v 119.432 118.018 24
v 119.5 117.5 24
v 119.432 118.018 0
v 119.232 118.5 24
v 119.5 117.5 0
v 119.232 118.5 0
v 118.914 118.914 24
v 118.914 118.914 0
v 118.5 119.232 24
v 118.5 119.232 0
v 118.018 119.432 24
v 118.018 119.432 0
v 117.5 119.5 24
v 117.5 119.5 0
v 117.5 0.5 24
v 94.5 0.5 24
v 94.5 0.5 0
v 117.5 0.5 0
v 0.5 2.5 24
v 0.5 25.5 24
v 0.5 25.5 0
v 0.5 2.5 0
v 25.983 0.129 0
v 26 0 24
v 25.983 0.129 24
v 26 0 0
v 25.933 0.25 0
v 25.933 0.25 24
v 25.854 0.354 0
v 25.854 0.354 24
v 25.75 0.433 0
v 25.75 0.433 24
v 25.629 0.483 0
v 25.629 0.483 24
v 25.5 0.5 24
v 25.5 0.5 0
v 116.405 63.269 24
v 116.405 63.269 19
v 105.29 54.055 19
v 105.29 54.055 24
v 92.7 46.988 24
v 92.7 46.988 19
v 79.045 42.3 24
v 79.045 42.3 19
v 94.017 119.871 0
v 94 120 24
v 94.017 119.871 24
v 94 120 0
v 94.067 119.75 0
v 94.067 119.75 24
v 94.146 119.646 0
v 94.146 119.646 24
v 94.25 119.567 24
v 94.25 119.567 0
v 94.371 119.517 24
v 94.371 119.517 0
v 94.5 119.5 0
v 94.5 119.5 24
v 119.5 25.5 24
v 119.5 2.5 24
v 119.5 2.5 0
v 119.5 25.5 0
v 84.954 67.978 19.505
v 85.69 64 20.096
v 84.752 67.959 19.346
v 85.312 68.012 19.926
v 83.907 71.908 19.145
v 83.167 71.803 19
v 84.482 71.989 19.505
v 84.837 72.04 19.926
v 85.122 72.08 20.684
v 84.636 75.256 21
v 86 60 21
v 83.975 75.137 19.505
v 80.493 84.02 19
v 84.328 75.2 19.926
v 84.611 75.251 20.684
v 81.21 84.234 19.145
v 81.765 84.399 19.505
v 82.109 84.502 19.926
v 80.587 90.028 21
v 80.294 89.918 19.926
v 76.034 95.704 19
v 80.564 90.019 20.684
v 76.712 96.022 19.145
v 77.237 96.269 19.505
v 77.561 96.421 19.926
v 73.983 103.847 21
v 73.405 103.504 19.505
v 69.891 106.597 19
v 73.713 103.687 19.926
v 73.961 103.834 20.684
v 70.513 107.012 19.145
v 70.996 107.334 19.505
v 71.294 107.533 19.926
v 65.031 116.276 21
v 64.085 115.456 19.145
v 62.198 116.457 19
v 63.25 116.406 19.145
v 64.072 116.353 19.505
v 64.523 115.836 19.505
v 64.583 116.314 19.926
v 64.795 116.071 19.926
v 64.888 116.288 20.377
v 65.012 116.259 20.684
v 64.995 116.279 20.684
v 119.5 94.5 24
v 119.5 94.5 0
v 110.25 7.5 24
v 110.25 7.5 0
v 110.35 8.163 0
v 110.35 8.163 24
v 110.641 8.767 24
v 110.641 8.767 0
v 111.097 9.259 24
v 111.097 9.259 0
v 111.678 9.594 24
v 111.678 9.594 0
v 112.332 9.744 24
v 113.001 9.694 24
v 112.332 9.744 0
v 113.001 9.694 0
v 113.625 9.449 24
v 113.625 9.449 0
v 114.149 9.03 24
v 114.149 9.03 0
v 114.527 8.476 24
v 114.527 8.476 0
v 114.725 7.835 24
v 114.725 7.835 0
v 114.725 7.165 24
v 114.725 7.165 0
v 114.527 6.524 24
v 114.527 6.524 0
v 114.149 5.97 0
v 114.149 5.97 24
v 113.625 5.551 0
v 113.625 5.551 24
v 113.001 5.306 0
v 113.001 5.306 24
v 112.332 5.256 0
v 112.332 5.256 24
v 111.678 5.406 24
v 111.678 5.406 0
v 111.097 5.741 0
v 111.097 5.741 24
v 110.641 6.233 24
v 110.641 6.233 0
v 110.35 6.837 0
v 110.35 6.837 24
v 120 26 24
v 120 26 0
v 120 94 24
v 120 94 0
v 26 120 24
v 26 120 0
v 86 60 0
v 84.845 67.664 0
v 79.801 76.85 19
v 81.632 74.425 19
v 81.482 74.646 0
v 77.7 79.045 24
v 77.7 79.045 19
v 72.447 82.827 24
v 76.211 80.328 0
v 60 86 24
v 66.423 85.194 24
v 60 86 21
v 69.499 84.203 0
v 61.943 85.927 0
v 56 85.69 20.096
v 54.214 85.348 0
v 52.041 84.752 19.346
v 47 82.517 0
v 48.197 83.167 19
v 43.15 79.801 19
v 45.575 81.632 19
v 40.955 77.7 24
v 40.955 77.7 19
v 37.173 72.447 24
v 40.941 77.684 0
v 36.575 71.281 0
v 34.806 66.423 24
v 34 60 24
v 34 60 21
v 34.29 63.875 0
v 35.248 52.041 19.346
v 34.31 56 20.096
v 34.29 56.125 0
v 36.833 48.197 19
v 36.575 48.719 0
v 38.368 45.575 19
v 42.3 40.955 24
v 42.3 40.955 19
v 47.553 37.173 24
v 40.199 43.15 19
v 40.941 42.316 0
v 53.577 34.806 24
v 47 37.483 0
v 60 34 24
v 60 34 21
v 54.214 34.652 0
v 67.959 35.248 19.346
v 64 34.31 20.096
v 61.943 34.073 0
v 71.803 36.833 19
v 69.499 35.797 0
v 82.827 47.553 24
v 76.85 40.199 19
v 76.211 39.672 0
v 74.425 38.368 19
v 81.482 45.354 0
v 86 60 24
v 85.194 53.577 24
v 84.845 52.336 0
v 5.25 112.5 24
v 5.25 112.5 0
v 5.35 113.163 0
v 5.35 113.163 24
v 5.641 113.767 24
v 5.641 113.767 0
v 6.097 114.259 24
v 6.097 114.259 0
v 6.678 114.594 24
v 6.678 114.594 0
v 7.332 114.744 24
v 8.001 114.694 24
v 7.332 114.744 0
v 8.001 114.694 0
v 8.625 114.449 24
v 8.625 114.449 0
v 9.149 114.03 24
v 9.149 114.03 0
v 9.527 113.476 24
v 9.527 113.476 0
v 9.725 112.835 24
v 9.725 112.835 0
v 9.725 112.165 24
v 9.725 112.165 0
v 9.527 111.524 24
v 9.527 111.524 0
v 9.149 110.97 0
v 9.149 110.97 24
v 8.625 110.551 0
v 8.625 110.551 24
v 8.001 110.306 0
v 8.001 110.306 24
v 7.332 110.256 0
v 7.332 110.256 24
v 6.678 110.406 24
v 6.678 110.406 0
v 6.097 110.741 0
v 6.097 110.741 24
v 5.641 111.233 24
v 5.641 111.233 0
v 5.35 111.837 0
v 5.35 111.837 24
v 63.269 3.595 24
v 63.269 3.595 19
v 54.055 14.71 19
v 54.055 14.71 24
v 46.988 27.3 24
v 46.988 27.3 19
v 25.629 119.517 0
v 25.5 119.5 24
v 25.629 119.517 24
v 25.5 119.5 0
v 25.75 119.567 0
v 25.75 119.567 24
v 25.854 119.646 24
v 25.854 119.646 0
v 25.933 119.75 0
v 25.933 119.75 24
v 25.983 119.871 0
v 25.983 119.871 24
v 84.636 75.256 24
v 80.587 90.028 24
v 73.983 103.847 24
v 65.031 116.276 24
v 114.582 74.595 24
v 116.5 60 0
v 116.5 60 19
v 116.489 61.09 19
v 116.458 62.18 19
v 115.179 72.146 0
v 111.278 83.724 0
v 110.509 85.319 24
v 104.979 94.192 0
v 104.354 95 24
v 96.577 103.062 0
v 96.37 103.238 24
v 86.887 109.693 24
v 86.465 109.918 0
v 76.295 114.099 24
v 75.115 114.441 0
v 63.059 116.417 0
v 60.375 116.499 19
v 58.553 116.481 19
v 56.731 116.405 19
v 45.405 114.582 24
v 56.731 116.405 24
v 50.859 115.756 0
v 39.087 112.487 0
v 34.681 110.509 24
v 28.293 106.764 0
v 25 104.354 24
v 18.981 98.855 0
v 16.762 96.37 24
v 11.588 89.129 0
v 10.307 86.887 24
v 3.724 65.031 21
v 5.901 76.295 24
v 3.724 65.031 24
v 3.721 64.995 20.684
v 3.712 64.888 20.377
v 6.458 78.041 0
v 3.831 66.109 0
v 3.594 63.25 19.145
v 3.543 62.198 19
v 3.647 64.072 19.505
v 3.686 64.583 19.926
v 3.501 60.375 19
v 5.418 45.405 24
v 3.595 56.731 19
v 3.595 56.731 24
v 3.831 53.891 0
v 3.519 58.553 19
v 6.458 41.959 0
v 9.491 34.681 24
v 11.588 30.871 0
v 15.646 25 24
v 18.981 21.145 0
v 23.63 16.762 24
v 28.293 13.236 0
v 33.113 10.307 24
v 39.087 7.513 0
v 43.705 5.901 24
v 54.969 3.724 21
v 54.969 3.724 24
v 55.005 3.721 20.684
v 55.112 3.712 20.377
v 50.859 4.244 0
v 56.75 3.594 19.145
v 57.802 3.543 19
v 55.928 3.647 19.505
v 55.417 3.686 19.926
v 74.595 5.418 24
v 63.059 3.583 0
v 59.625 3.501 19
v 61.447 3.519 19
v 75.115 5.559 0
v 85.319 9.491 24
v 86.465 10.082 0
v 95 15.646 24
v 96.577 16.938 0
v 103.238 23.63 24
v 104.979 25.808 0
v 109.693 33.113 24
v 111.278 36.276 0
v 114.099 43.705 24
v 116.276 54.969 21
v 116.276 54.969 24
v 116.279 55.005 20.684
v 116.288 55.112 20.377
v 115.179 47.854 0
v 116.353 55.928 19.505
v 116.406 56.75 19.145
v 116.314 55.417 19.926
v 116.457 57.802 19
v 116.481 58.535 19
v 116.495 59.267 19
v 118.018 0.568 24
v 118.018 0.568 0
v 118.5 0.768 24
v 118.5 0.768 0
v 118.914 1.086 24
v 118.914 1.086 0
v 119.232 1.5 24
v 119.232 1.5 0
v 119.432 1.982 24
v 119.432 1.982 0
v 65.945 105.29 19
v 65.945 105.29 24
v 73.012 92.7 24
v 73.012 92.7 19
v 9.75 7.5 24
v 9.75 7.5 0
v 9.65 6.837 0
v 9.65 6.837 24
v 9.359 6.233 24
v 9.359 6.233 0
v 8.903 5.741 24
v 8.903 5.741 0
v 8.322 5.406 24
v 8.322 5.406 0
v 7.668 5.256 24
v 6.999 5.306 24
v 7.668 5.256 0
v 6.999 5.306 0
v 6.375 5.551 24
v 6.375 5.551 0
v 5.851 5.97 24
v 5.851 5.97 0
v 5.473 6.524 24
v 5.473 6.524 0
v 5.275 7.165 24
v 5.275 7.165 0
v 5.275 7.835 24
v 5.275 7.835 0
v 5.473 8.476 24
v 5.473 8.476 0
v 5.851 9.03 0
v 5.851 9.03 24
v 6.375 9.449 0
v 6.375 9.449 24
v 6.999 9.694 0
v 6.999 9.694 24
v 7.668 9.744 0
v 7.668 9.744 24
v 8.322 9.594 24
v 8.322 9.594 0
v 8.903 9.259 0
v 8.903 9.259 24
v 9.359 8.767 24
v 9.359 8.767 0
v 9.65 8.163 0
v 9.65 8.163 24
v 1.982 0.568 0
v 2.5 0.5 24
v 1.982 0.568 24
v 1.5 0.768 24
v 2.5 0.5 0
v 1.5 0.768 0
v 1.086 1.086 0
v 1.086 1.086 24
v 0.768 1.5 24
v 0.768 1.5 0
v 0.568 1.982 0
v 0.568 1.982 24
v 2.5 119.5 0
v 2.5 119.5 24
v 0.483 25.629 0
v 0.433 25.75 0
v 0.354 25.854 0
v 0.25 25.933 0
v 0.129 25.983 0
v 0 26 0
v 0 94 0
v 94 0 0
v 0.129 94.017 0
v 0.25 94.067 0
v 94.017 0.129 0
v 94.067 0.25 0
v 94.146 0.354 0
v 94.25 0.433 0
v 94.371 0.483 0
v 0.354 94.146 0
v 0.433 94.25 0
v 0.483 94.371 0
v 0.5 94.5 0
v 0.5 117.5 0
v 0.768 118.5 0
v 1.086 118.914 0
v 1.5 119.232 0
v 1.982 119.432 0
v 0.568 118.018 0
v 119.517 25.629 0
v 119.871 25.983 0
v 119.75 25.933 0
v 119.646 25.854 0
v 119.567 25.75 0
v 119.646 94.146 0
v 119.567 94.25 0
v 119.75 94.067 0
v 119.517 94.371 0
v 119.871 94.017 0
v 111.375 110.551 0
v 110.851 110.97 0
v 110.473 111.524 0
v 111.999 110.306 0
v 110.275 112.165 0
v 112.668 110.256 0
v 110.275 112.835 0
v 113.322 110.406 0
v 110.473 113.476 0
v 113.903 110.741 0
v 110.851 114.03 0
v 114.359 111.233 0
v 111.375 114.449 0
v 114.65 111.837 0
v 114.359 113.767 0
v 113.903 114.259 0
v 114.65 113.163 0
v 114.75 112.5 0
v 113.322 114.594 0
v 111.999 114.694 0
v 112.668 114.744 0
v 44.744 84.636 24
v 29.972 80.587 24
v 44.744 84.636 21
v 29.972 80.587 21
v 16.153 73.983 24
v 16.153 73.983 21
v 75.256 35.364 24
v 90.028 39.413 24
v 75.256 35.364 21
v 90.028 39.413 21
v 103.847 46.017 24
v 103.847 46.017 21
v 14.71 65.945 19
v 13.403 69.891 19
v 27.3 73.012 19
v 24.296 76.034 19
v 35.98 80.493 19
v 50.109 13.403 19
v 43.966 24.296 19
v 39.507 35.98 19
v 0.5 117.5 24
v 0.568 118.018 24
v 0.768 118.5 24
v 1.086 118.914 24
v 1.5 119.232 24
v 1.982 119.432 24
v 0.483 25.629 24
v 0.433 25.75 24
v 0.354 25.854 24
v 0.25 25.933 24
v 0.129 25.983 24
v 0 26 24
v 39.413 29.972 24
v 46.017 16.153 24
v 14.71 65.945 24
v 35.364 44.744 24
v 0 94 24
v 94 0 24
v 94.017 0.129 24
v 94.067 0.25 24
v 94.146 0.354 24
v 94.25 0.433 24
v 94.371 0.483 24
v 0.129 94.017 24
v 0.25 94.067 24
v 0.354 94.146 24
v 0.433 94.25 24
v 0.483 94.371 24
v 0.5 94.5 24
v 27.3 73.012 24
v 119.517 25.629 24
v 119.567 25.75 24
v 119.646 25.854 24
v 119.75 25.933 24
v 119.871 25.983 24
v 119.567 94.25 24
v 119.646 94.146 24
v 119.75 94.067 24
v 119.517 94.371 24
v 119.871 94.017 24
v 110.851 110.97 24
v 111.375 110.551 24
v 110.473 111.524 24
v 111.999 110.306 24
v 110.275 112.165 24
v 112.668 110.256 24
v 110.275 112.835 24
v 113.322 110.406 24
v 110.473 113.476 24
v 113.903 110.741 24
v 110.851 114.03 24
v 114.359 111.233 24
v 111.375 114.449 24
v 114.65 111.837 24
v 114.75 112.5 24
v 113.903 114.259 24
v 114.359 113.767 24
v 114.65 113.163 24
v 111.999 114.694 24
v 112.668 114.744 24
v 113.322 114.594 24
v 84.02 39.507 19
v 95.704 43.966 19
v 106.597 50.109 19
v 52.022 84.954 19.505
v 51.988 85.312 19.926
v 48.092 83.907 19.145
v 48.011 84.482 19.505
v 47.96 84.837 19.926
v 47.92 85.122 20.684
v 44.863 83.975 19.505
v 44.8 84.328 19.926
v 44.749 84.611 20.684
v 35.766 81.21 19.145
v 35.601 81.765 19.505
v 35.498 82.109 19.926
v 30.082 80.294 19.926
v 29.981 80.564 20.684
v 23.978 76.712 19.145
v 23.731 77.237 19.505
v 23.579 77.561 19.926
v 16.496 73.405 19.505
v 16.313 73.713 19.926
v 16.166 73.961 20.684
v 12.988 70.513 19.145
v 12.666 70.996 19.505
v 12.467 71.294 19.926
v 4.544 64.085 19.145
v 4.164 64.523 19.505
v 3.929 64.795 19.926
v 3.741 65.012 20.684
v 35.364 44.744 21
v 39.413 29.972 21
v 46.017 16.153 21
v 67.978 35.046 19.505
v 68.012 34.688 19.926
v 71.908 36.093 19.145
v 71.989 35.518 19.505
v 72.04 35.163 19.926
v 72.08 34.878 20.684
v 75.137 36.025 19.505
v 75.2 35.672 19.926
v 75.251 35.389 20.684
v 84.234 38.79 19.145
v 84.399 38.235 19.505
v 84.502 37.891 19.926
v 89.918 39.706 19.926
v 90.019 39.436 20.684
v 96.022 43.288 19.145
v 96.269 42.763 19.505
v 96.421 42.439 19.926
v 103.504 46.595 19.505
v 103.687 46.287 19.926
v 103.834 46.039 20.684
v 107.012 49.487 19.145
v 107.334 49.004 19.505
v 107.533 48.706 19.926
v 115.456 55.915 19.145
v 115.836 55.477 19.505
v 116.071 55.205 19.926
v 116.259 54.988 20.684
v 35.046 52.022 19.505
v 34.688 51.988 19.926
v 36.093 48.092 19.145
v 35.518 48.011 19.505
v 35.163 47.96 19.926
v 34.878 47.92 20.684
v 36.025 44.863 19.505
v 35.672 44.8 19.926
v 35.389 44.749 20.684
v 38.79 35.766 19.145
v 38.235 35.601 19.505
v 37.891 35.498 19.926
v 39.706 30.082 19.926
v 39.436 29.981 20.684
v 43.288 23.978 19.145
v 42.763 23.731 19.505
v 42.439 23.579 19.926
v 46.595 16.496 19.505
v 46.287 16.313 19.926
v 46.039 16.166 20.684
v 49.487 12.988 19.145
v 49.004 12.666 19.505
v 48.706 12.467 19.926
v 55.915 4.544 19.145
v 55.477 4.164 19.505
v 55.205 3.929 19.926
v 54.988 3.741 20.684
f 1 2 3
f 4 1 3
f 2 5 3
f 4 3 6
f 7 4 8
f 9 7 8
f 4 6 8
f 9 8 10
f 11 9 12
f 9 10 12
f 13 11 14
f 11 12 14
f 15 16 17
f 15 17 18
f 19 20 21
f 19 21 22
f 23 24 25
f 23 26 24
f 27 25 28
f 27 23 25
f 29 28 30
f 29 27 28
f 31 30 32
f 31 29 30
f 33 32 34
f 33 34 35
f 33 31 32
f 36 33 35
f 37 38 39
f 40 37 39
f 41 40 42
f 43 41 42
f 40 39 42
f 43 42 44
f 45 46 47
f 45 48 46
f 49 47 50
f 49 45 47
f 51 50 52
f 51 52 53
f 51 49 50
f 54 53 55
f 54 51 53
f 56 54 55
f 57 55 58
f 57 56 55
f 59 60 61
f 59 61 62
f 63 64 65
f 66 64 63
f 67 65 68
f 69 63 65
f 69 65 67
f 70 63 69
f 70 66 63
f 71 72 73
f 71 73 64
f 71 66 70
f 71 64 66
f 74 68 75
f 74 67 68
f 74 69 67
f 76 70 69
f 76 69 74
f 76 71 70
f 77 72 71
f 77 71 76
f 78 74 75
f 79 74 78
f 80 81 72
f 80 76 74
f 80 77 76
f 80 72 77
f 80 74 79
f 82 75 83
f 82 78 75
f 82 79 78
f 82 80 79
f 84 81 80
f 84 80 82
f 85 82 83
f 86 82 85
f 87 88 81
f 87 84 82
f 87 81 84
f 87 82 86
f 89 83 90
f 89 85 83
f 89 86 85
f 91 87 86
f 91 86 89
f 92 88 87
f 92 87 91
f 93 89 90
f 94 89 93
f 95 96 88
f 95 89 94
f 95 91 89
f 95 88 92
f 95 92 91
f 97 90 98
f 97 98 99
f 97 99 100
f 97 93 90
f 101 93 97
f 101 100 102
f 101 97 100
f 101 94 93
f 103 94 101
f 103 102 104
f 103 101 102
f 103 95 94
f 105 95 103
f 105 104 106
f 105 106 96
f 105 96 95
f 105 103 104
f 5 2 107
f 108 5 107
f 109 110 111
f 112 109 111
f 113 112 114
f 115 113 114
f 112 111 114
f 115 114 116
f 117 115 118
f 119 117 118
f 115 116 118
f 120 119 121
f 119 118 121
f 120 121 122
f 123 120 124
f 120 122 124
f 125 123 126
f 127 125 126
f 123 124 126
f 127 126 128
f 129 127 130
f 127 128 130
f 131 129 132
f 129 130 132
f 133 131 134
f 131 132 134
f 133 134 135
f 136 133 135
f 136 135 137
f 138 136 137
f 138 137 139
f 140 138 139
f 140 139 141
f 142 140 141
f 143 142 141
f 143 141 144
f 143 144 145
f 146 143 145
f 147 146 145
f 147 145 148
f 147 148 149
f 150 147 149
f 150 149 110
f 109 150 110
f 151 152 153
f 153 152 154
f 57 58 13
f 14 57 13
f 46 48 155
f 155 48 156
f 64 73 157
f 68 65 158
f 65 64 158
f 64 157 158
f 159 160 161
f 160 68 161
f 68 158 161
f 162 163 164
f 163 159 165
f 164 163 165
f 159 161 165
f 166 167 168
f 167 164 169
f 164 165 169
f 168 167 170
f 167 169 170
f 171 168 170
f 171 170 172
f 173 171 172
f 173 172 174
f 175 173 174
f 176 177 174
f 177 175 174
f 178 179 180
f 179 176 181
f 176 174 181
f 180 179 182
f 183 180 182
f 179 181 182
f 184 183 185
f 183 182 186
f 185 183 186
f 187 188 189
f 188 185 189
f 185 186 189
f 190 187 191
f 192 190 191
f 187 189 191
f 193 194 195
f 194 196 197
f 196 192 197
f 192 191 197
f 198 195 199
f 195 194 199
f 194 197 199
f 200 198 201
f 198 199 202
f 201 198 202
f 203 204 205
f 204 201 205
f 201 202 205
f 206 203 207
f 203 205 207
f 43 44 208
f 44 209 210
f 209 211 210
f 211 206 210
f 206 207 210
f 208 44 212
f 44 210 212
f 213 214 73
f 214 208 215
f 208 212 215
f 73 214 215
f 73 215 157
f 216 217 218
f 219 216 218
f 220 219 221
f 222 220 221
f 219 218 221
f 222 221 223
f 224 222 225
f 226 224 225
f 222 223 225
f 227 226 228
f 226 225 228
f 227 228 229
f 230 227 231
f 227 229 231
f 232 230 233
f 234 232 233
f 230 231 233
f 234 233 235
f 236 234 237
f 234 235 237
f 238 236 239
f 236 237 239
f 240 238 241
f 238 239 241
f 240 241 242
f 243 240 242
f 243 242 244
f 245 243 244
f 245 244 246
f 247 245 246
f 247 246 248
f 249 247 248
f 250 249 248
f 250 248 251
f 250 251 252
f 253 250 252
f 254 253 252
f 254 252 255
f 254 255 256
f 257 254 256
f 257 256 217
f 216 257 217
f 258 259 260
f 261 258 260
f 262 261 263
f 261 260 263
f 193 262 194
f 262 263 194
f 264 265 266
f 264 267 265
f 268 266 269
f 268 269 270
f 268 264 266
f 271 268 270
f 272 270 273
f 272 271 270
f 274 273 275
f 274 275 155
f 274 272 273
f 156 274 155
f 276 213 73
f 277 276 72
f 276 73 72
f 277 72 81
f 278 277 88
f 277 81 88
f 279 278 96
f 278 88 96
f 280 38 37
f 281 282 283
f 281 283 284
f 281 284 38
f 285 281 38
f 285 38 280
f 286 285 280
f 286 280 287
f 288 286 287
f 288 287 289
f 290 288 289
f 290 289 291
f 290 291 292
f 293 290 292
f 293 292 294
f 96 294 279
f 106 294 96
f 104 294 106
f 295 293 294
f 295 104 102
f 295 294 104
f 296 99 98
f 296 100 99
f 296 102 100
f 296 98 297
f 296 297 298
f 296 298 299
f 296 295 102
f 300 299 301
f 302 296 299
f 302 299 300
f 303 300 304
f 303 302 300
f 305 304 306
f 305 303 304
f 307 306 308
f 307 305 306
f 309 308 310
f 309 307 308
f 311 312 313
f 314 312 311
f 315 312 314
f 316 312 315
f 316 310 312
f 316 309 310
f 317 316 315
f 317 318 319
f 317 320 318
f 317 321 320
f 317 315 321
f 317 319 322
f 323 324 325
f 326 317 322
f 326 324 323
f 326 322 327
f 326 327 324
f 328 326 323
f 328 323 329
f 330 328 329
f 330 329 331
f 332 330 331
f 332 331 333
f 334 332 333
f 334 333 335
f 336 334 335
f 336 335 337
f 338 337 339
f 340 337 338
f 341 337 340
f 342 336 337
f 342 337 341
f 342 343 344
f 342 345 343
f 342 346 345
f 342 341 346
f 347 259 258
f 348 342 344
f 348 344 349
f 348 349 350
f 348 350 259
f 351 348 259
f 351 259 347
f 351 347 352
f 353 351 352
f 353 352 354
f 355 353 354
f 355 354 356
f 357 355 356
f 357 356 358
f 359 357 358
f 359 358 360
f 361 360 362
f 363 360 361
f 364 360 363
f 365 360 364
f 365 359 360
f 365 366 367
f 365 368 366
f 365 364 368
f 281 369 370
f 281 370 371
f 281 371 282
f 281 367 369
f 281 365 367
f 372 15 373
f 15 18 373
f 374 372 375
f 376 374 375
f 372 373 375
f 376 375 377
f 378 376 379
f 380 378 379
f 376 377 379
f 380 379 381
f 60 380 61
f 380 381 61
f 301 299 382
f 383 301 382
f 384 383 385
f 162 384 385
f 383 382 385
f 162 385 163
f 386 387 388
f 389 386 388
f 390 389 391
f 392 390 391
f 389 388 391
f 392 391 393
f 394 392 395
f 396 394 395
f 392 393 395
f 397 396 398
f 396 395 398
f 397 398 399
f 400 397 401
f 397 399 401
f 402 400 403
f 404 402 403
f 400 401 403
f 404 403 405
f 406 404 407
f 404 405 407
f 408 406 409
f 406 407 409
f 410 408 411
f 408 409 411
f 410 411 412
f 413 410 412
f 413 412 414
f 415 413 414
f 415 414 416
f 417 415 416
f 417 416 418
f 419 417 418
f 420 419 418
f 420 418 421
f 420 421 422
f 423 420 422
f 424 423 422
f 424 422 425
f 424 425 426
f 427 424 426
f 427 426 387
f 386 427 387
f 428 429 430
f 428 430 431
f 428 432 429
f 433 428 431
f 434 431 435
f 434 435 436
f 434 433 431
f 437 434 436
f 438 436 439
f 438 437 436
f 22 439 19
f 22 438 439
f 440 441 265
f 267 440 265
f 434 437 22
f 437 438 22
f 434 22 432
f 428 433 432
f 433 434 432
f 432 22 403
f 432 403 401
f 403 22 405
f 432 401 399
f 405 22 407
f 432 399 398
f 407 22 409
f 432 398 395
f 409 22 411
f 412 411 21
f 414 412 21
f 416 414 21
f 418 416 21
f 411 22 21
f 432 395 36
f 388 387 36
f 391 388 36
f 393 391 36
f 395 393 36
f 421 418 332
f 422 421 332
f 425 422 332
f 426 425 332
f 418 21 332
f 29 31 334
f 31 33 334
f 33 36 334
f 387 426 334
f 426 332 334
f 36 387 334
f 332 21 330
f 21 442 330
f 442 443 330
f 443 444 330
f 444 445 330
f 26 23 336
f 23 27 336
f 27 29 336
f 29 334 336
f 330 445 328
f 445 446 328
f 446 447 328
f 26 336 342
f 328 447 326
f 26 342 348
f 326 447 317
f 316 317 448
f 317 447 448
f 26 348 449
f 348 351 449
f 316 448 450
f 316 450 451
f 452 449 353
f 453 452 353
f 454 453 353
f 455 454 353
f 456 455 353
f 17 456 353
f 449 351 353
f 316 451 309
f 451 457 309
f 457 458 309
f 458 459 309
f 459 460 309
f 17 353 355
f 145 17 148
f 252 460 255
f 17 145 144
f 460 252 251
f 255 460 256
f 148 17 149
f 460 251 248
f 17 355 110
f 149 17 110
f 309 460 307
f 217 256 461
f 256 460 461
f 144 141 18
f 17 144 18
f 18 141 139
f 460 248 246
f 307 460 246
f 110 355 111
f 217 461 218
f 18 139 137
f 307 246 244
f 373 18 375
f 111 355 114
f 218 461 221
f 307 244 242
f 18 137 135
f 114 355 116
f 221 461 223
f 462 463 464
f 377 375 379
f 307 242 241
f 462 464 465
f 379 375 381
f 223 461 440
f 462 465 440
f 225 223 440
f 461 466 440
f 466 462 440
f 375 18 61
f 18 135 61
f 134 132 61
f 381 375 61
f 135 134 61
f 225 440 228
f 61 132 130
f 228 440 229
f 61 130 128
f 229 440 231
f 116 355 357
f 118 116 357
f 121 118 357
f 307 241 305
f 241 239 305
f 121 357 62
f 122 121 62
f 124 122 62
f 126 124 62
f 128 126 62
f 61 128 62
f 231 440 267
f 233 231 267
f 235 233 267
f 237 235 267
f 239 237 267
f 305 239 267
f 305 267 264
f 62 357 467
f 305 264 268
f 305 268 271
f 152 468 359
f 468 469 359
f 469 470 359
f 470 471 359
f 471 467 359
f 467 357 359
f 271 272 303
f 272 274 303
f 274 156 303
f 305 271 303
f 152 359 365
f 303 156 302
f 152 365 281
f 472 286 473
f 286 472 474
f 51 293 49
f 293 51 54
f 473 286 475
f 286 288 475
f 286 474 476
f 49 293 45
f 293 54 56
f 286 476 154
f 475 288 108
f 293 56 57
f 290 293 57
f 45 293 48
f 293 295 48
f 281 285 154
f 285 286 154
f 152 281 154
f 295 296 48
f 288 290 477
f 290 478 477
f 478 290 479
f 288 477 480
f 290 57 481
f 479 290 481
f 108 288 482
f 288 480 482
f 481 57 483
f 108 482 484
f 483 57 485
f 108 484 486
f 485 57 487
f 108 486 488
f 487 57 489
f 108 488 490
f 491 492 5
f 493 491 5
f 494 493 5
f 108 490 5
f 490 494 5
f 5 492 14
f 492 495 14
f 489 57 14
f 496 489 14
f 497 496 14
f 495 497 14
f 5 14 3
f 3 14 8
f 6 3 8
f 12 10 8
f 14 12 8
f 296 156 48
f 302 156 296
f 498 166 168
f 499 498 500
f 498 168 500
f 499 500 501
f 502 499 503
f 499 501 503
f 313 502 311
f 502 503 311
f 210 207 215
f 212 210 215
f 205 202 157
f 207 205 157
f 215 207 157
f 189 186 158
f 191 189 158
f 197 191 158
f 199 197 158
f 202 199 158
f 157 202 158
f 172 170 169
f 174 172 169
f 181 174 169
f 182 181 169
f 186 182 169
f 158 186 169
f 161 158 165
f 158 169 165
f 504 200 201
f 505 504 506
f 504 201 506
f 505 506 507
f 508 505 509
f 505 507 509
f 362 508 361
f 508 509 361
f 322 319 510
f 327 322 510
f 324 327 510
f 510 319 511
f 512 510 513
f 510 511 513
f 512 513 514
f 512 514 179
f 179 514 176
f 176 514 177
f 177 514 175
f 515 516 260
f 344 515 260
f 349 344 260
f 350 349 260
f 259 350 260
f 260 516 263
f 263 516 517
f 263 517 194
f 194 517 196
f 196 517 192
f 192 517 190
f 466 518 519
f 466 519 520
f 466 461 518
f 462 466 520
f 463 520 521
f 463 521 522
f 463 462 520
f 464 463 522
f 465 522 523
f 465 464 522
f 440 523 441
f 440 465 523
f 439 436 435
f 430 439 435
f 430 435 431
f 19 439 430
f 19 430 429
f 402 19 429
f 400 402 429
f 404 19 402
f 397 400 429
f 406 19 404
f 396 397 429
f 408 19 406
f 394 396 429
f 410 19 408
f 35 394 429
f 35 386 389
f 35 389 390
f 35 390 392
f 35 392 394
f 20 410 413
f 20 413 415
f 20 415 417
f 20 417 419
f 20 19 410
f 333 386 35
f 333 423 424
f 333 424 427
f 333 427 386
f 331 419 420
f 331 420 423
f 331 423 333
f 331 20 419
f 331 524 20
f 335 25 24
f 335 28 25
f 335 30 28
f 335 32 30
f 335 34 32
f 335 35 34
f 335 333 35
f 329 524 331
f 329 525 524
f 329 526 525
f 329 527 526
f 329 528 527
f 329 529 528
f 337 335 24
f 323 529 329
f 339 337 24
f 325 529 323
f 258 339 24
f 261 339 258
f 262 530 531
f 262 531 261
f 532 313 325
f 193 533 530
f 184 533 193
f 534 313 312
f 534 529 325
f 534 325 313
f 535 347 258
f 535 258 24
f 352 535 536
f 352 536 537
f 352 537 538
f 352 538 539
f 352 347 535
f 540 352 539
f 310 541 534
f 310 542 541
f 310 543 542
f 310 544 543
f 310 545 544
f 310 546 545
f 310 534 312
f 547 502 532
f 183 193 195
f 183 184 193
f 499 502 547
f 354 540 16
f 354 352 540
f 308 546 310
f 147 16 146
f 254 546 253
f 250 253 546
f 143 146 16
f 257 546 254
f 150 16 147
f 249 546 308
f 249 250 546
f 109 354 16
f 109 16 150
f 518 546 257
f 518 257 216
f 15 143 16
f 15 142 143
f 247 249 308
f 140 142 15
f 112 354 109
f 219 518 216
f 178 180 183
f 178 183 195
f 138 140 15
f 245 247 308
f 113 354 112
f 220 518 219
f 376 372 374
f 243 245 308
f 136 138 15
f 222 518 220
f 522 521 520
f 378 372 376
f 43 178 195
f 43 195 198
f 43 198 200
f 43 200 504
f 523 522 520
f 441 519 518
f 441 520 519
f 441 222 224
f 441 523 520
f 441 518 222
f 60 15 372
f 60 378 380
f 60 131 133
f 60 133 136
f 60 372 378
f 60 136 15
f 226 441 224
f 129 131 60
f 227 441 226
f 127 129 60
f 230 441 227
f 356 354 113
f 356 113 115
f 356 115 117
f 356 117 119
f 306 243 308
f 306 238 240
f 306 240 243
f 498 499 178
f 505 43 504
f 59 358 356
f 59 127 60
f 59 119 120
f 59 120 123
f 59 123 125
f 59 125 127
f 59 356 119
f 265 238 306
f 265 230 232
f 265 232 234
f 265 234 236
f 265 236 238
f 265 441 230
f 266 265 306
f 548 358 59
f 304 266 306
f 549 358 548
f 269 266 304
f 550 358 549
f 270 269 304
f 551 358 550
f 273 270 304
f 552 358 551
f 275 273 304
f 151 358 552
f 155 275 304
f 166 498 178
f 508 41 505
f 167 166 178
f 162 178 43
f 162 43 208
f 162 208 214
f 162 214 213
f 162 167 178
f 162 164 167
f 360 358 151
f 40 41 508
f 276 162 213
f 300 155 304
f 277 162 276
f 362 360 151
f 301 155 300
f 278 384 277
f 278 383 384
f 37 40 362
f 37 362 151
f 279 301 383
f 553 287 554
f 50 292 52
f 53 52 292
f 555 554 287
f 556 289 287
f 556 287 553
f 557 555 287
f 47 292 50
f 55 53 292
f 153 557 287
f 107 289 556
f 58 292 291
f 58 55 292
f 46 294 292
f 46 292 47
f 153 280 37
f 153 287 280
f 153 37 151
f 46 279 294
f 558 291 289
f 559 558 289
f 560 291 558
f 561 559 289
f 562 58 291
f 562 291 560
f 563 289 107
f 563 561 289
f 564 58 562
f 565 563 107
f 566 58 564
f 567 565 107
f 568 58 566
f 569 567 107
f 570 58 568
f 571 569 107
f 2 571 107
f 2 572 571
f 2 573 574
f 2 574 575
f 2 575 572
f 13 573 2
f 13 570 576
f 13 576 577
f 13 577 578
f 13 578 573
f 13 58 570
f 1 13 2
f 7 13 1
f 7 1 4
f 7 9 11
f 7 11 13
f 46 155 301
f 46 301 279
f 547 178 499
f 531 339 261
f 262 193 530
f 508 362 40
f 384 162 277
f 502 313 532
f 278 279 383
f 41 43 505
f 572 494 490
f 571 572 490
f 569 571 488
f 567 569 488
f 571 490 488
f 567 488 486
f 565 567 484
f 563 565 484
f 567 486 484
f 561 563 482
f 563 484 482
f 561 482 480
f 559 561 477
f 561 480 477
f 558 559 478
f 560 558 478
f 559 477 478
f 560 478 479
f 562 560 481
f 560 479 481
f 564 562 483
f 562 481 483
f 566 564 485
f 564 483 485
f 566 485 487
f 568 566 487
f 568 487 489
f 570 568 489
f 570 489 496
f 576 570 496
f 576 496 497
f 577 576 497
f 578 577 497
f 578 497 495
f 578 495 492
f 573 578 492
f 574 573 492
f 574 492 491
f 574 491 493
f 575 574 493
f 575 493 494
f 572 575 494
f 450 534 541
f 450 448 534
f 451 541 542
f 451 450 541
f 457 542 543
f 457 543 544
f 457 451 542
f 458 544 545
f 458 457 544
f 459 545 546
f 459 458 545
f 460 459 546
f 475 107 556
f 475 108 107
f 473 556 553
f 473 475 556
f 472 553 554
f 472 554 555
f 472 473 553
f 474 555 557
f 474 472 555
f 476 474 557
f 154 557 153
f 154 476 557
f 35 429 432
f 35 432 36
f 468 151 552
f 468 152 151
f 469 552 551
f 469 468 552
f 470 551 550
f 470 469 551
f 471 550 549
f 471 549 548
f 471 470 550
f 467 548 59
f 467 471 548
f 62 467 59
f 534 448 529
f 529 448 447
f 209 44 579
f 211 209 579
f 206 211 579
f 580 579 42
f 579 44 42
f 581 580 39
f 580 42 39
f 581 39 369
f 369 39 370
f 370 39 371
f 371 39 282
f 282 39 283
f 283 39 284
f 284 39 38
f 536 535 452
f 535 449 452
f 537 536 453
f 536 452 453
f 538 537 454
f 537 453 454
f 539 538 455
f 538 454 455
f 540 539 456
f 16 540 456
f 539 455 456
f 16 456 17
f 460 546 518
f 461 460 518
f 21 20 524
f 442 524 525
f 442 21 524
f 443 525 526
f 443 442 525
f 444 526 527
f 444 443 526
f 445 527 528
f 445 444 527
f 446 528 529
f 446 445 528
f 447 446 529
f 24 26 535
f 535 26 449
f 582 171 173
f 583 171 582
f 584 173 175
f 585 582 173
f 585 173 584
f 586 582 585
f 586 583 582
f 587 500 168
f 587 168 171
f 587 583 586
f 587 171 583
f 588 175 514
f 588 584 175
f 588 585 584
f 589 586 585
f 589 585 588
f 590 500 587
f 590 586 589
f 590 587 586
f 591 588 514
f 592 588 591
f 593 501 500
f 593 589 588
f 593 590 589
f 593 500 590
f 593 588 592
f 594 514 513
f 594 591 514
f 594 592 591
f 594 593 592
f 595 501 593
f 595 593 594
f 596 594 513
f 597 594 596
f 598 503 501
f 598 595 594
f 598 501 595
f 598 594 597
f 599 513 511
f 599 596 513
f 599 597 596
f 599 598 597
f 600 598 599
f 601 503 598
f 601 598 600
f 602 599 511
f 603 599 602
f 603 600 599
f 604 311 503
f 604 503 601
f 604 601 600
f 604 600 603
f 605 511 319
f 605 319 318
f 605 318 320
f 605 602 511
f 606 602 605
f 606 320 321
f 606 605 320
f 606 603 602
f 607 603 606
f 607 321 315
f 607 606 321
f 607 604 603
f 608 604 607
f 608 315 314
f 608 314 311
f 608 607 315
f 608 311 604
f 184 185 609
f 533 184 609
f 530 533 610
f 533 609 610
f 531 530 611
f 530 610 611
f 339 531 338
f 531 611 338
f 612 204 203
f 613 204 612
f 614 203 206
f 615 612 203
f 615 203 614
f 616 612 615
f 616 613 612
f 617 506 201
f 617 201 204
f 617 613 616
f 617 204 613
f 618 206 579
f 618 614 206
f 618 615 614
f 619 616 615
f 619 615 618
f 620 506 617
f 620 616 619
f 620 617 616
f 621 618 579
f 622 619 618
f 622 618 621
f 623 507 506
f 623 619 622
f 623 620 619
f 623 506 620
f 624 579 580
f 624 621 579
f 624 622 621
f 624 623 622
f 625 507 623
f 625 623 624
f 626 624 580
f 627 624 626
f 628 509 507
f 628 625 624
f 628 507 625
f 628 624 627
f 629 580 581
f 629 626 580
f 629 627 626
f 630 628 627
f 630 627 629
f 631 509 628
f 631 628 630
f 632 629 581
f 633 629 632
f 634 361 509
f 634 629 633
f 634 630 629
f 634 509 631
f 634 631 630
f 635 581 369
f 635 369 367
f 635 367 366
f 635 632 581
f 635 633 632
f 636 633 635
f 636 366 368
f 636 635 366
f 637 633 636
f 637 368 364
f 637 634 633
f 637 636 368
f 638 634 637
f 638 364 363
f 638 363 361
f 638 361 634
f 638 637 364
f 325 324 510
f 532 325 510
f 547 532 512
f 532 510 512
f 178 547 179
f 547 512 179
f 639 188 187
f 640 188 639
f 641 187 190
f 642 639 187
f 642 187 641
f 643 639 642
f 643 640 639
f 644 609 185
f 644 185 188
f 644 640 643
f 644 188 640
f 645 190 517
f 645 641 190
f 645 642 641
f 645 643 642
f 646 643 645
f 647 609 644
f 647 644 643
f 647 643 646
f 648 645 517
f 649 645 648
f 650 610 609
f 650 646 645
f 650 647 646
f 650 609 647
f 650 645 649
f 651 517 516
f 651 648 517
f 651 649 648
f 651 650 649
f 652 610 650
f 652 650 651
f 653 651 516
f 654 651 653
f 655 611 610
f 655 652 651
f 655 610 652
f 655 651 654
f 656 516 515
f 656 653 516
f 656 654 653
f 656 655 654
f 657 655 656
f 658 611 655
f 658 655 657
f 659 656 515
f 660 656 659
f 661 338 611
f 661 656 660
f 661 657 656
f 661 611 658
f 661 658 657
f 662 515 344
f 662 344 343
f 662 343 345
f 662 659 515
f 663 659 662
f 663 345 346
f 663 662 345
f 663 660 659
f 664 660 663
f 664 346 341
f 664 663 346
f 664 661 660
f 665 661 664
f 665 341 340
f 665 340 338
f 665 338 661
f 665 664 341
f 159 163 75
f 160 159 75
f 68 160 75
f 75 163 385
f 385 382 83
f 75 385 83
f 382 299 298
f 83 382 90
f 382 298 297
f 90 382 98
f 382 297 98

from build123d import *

# Parameters (mm, degrees)
ESQUISSE1_R             = 56.5
BOSS_EXTRU_1_DEPTH      = 24
ESQUISSE1_R_2           = 26
BOSS_EXTRU_1_2_DEPTH    = 24
ENL_V_MAT_EXTRU_1_DEPTH = 172.394282285
CONG_1_R                = 0.5
CONG_2_R                = 2
BOSS_EXTRU_2_START      = -5
BOSS_EXTRU_2_DEPTH      = 5
CONG_3_R                = 2
ESQUISSE4_R             = 2.25
ENL_V_MAT_EXTRU_2_DEPTH = 172.394282299


# Some blends are built 0.0001 mm under size
with BuildPart() as part:
    # Esquisse1 → Boss.-Extru.1 (new body)
    with BuildSketch(Plane.XY):
        Polygon((0, 95), (0, 0), (120, 0), (120, 120), (32.113356809, 120), (0.4, 120), (0, 120), (0, 114.342406945), align=None)
        with Locations((60, 60)):
            Circle(ESQUISSE1_R, mode=Mode.SUBTRACT)
    extrude(amount=BOSS_EXTRU_1_DEPTH)

    # Esquisse2 → Enlèv. mat.-Extru.1 (cut, through all)
    with BuildSketch(Plane.XY.offset(24)):
        Polygon((0, 94), (0.5, 94), (0.5, 119.5), (26, 119.5), (26, 120), (0, 120), align=None)
        Polygon((26, 0.5), (26, 0), (0, 0), (0, 26), (0.5, 26), (0.5, 0.5), align=None)
        Polygon((120, 0), (94, 0), (94, 0.5), (119.5, 0.5), (119.5, 26), (120, 26), align=None)
        Polygon((120, 120), (94, 120), (94, 119.5), (119.5, 119.5), (119.5, 94), (120, 94), align=None)
    extrude(amount=-ENL_V_MAT_EXTRU_1_DEPTH, mode=Mode.SUBTRACT)

    # Congé1
    cong_1_edges = [part.edges().sort_by_distance(p)[0] for p in [
        (94, 119.5, 12),
        (119.5, 94, 12),
        (94, 0.5, 12),
        (119.5, 26, 12),
        (26, 0.5, 12),
        (0.5, 26, 12),
        (0.5, 94, 12),
        (26, 119.5, 12),
    ]]
    fillet(cong_1_edges, radius=CONG_1_R - 0.0001)  # a hair under: the kernel refuses the full size

    # Congé2
    cong_2_edges = [part.edges().sort_by_distance(p)[0] for p in [
        (119.5, 119.5, 12),
        (119.5, 0.5, 12),
        (0.5, 0.5, 12),
        (0.5, 119.5, 12),
    ]]
    fillet(cong_2_edges, radius=CONG_2_R)



with BuildPart() as body_2:
    # Esquisse1 → Boss.-Extru.1 2 (new body)
    with BuildSketch(Plane.XY):
        with Locations((60, 60)):
            Circle(ESQUISSE1_R_2)
    extrude(amount=BOSS_EXTRU_1_2_DEPTH)


with BuildPart() as part_1:
    add(part.part)

    add(body_2.part)  # Boss.-Extru.2 merges body 2
    # Esquisse3 → Boss.-Extru.2 (add)
    with BuildSketch(Plane.XY.offset(24).offset(BOSS_EXTRU_2_START)):
        with BuildLine():
            ThreePointArc((3.724458924, 65.03125), (3.506910291, 60.883637464), (3.594634356, 56.73125))
            ThreePointArc((3.594634356, 56.73125), (20.845057368, 69.763102479), (40.955053164, 77.7))
            ThreePointArc((40.955053164, 77.7), (49.612507521, 83.834848437), (60, 86))
            ThreePointArc((60, 86), (29.972408521, 80.587491275), (3.724458924, 65.03125))
        make_face()
        with BuildLine():
            ThreePointArc((65.03125, 116.275541076), (60.883637464, 116.493089709), (56.73125, 116.405365644))
            ThreePointArc((56.73125, 116.405365644), (69.763102479, 99.154942632), (77.7, 79.044946836))
            ThreePointArc((77.7, 79.044946836), (83.834848437, 70.387492479), (86, 60))
            ThreePointArc((86, 60), (80.587491275, 90.027591479), (65.03125, 116.275541076))
        make_face()
        with BuildLine():
            ThreePointArc((60, 34), (90.027591479, 39.412508725), (116.275541076, 54.96875))
            ThreePointArc((116.275541076, 54.96875), (116.443857375, 57.481872801), (116.5, 60))
            ThreePointArc((116.5, 60), (116.476336456, 61.635059802), (116.405365644, 63.26875))
            ThreePointArc((116.405365644, 63.26875), (99.154942632, 50.236897521), (79.044946836, 42.3))
            ThreePointArc((79.044946836, 42.3), (70.387492479, 36.165151563), (60, 34))
        make_face()
        with BuildLine():
            ThreePointArc((34, 60), (39.412508725, 29.972408521), (54.96875, 3.724458924))
            ThreePointArc((54.96875, 3.724458924), (59.116362536, 3.506910291), (63.26875, 3.594634356))
            ThreePointArc((63.26875, 3.594634356), (50.236897521, 20.845057368), (42.3, 40.955053164))
            ThreePointArc((42.3, 40.955053164), (36.165151563, 49.612507521), (34, 60))
        make_face()
    extrude(amount=BOSS_EXTRU_2_DEPTH)

    # Congé3
    # the kernel refuses this fillet: 2 mm, written as the material it takes off along each edge
    with BuildSketch(Plane(origin=(60, 0, 19), x_dir=(0.17354982017034465, 0.9848250910282704, 0), z_dir=(0.9848250910282704, -0.17354982017034465, 0))) as cong_3_piece_1_section:
        with BuildLine():
            CenterArc((86 - CONG_3_R, CONG_3_R), CONG_3_R, 270, 90)
            Line((86, CONG_3_R), (86, 0))
            Line((86, 0), (86 - CONG_3_R, 0))
        make_face()
    cong_3_piece_1 = revolve(axis=Axis((60, 0, 19), (0, 0, 1)), revolution_arc=54.197355046, mode=Mode.PRIVATE)
    cong_3_piece_1 = cong_3_piece_1 & Plane(origin=(60, 60, 19), x_dir=(1, 0, 0), z_dir=(0, 0, -1)) * Cylinder(56.5, 344, mode=Mode.PRIVATE)
    cong_3_piece_1 = cong_3_piece_1 - Plane(origin=(60, 60, 19), x_dir=(1, 0, 0), z_dir=(0, 0, -1)) * Cylinder(26, 344, mode=Mode.PRIVATE)
    add(cong_3_piece_1, mode=Mode.SUBTRACT)
    with BuildSketch(Plane(origin=(0, 60, 19), x_dir=(0.9848250910282706, -0.17354982017034323, 0), z_dir=(-0.17354982017034323, -0.9848250910282706, 0))) as cong_3_piece_2_section:
        with BuildLine():
            CenterArc((86 - CONG_3_R, CONG_3_R), CONG_3_R, 270, 90)
            Line((86, CONG_3_R), (86, 0))
            Line((86, 0), (86 - CONG_3_R, 0))
        make_face()
    cong_3_piece_2 = revolve(axis=Axis((0, 60, 19), (0, 0, 1)), revolution_arc=54.197355046, mode=Mode.PRIVATE)
    cong_3_piece_2 = cong_3_piece_2 & Plane(origin=(60, 60, 19), x_dir=(1, 0, 0), z_dir=(0, 0, -1)) * Cylinder(56.5, 345, mode=Mode.PRIVATE)
    cong_3_piece_2 = cong_3_piece_2 - Plane(origin=(60, 60, 19), x_dir=(1, 0, 0), z_dir=(0, 0, -1)) * Cylinder(26, 345, mode=Mode.PRIVATE)
    add(cong_3_piece_2, mode=Mode.SUBTRACT)
    with BuildSketch(Plane(origin=(60, 120, 19), x_dir=(-0.17354982017035084, -0.9848250910282692, 0), z_dir=(-0.9848250910282692, 0.17354982017035084, 0))) as cong_3_piece_3_section:
        with BuildLine():
            CenterArc((86 - CONG_3_R, CONG_3_R), CONG_3_R, 270, 90)
            Line((86, CONG_3_R), (86, 0))
            Line((86, 0), (86 - CONG_3_R, 0))
        make_face()
    cong_3_piece_3 = revolve(axis=Axis((60, 120, 19), (0, 0, 1)), revolution_arc=54.197355046, mode=Mode.PRIVATE)
    cong_3_piece_3 = cong_3_piece_3 & Plane(origin=(60, 60, 19), x_dir=(1, 0, 0), z_dir=(0, 0, -1)) * Cylinder(56.5, 344, mode=Mode.PRIVATE)
    cong_3_piece_3 = cong_3_piece_3 - Plane(origin=(60, 60, 19), x_dir=(1, 0, 0), z_dir=(0, 0, -1)) * Cylinder(26, 344, mode=Mode.PRIVATE)
    add(cong_3_piece_3, mode=Mode.SUBTRACT)
    with BuildSketch(Plane(origin=(120, 60, 19), x_dir=(-0.9848250910282709, 0.17354982017034223, 0), z_dir=(0.17354982017034223, 0.9848250910282709, 0))) as cong_3_piece_4_section:
        with BuildLine():
            CenterArc((86 - CONG_3_R, CONG_3_R), CONG_3_R, 270, 90)
            Line((86, CONG_3_R), (86, 0))
            Line((86, 0), (86 - CONG_3_R, 0))
        make_face()
    cong_3_piece_4 = revolve(axis=Axis((120, 60, 19), (0, 0, 1)), revolution_arc=54.197355046, mode=Mode.PRIVATE)
    cong_3_piece_4 = cong_3_piece_4 & Plane(origin=(60, 60, 19), x_dir=(1, 0, 0), z_dir=(0, 0, -1)) * Cylinder(56.5, 344, mode=Mode.PRIVATE)
    cong_3_piece_4 = cong_3_piece_4 - Plane(origin=(60, 60, 19), x_dir=(1, 0, 0), z_dir=(0, 0, -1)) * Cylinder(26, 344, mode=Mode.PRIVATE)
    add(cong_3_piece_4, mode=Mode.SUBTRACT)

    # Esquisse4 → Enlèv. mat.-Extru.2 (cut, through all)
    with BuildSketch(Plane(origin=(0, 0, 0), x_dir=(-1, 0, 0), z_dir=(0, 0, -1))):
        with Locations((-7.5, 112.5)):
            Circle(ESQUISSE4_R)
        with Locations(Location((-112.5, 112.5, 0), (0, 0, 180))):
            Circle(ESQUISSE4_R)
        with Locations(Location((-7.5, 7.5, 0), (0, 0, 180))):
            Circle(ESQUISSE4_R)
        with Locations((-112.5, 7.5)):
            Circle(ESQUISSE4_R)
    extrude(amount=-ENL_V_MAT_EXTRU_2_DEPTH, mode=Mode.SUBTRACT)


solid = part_1.part
